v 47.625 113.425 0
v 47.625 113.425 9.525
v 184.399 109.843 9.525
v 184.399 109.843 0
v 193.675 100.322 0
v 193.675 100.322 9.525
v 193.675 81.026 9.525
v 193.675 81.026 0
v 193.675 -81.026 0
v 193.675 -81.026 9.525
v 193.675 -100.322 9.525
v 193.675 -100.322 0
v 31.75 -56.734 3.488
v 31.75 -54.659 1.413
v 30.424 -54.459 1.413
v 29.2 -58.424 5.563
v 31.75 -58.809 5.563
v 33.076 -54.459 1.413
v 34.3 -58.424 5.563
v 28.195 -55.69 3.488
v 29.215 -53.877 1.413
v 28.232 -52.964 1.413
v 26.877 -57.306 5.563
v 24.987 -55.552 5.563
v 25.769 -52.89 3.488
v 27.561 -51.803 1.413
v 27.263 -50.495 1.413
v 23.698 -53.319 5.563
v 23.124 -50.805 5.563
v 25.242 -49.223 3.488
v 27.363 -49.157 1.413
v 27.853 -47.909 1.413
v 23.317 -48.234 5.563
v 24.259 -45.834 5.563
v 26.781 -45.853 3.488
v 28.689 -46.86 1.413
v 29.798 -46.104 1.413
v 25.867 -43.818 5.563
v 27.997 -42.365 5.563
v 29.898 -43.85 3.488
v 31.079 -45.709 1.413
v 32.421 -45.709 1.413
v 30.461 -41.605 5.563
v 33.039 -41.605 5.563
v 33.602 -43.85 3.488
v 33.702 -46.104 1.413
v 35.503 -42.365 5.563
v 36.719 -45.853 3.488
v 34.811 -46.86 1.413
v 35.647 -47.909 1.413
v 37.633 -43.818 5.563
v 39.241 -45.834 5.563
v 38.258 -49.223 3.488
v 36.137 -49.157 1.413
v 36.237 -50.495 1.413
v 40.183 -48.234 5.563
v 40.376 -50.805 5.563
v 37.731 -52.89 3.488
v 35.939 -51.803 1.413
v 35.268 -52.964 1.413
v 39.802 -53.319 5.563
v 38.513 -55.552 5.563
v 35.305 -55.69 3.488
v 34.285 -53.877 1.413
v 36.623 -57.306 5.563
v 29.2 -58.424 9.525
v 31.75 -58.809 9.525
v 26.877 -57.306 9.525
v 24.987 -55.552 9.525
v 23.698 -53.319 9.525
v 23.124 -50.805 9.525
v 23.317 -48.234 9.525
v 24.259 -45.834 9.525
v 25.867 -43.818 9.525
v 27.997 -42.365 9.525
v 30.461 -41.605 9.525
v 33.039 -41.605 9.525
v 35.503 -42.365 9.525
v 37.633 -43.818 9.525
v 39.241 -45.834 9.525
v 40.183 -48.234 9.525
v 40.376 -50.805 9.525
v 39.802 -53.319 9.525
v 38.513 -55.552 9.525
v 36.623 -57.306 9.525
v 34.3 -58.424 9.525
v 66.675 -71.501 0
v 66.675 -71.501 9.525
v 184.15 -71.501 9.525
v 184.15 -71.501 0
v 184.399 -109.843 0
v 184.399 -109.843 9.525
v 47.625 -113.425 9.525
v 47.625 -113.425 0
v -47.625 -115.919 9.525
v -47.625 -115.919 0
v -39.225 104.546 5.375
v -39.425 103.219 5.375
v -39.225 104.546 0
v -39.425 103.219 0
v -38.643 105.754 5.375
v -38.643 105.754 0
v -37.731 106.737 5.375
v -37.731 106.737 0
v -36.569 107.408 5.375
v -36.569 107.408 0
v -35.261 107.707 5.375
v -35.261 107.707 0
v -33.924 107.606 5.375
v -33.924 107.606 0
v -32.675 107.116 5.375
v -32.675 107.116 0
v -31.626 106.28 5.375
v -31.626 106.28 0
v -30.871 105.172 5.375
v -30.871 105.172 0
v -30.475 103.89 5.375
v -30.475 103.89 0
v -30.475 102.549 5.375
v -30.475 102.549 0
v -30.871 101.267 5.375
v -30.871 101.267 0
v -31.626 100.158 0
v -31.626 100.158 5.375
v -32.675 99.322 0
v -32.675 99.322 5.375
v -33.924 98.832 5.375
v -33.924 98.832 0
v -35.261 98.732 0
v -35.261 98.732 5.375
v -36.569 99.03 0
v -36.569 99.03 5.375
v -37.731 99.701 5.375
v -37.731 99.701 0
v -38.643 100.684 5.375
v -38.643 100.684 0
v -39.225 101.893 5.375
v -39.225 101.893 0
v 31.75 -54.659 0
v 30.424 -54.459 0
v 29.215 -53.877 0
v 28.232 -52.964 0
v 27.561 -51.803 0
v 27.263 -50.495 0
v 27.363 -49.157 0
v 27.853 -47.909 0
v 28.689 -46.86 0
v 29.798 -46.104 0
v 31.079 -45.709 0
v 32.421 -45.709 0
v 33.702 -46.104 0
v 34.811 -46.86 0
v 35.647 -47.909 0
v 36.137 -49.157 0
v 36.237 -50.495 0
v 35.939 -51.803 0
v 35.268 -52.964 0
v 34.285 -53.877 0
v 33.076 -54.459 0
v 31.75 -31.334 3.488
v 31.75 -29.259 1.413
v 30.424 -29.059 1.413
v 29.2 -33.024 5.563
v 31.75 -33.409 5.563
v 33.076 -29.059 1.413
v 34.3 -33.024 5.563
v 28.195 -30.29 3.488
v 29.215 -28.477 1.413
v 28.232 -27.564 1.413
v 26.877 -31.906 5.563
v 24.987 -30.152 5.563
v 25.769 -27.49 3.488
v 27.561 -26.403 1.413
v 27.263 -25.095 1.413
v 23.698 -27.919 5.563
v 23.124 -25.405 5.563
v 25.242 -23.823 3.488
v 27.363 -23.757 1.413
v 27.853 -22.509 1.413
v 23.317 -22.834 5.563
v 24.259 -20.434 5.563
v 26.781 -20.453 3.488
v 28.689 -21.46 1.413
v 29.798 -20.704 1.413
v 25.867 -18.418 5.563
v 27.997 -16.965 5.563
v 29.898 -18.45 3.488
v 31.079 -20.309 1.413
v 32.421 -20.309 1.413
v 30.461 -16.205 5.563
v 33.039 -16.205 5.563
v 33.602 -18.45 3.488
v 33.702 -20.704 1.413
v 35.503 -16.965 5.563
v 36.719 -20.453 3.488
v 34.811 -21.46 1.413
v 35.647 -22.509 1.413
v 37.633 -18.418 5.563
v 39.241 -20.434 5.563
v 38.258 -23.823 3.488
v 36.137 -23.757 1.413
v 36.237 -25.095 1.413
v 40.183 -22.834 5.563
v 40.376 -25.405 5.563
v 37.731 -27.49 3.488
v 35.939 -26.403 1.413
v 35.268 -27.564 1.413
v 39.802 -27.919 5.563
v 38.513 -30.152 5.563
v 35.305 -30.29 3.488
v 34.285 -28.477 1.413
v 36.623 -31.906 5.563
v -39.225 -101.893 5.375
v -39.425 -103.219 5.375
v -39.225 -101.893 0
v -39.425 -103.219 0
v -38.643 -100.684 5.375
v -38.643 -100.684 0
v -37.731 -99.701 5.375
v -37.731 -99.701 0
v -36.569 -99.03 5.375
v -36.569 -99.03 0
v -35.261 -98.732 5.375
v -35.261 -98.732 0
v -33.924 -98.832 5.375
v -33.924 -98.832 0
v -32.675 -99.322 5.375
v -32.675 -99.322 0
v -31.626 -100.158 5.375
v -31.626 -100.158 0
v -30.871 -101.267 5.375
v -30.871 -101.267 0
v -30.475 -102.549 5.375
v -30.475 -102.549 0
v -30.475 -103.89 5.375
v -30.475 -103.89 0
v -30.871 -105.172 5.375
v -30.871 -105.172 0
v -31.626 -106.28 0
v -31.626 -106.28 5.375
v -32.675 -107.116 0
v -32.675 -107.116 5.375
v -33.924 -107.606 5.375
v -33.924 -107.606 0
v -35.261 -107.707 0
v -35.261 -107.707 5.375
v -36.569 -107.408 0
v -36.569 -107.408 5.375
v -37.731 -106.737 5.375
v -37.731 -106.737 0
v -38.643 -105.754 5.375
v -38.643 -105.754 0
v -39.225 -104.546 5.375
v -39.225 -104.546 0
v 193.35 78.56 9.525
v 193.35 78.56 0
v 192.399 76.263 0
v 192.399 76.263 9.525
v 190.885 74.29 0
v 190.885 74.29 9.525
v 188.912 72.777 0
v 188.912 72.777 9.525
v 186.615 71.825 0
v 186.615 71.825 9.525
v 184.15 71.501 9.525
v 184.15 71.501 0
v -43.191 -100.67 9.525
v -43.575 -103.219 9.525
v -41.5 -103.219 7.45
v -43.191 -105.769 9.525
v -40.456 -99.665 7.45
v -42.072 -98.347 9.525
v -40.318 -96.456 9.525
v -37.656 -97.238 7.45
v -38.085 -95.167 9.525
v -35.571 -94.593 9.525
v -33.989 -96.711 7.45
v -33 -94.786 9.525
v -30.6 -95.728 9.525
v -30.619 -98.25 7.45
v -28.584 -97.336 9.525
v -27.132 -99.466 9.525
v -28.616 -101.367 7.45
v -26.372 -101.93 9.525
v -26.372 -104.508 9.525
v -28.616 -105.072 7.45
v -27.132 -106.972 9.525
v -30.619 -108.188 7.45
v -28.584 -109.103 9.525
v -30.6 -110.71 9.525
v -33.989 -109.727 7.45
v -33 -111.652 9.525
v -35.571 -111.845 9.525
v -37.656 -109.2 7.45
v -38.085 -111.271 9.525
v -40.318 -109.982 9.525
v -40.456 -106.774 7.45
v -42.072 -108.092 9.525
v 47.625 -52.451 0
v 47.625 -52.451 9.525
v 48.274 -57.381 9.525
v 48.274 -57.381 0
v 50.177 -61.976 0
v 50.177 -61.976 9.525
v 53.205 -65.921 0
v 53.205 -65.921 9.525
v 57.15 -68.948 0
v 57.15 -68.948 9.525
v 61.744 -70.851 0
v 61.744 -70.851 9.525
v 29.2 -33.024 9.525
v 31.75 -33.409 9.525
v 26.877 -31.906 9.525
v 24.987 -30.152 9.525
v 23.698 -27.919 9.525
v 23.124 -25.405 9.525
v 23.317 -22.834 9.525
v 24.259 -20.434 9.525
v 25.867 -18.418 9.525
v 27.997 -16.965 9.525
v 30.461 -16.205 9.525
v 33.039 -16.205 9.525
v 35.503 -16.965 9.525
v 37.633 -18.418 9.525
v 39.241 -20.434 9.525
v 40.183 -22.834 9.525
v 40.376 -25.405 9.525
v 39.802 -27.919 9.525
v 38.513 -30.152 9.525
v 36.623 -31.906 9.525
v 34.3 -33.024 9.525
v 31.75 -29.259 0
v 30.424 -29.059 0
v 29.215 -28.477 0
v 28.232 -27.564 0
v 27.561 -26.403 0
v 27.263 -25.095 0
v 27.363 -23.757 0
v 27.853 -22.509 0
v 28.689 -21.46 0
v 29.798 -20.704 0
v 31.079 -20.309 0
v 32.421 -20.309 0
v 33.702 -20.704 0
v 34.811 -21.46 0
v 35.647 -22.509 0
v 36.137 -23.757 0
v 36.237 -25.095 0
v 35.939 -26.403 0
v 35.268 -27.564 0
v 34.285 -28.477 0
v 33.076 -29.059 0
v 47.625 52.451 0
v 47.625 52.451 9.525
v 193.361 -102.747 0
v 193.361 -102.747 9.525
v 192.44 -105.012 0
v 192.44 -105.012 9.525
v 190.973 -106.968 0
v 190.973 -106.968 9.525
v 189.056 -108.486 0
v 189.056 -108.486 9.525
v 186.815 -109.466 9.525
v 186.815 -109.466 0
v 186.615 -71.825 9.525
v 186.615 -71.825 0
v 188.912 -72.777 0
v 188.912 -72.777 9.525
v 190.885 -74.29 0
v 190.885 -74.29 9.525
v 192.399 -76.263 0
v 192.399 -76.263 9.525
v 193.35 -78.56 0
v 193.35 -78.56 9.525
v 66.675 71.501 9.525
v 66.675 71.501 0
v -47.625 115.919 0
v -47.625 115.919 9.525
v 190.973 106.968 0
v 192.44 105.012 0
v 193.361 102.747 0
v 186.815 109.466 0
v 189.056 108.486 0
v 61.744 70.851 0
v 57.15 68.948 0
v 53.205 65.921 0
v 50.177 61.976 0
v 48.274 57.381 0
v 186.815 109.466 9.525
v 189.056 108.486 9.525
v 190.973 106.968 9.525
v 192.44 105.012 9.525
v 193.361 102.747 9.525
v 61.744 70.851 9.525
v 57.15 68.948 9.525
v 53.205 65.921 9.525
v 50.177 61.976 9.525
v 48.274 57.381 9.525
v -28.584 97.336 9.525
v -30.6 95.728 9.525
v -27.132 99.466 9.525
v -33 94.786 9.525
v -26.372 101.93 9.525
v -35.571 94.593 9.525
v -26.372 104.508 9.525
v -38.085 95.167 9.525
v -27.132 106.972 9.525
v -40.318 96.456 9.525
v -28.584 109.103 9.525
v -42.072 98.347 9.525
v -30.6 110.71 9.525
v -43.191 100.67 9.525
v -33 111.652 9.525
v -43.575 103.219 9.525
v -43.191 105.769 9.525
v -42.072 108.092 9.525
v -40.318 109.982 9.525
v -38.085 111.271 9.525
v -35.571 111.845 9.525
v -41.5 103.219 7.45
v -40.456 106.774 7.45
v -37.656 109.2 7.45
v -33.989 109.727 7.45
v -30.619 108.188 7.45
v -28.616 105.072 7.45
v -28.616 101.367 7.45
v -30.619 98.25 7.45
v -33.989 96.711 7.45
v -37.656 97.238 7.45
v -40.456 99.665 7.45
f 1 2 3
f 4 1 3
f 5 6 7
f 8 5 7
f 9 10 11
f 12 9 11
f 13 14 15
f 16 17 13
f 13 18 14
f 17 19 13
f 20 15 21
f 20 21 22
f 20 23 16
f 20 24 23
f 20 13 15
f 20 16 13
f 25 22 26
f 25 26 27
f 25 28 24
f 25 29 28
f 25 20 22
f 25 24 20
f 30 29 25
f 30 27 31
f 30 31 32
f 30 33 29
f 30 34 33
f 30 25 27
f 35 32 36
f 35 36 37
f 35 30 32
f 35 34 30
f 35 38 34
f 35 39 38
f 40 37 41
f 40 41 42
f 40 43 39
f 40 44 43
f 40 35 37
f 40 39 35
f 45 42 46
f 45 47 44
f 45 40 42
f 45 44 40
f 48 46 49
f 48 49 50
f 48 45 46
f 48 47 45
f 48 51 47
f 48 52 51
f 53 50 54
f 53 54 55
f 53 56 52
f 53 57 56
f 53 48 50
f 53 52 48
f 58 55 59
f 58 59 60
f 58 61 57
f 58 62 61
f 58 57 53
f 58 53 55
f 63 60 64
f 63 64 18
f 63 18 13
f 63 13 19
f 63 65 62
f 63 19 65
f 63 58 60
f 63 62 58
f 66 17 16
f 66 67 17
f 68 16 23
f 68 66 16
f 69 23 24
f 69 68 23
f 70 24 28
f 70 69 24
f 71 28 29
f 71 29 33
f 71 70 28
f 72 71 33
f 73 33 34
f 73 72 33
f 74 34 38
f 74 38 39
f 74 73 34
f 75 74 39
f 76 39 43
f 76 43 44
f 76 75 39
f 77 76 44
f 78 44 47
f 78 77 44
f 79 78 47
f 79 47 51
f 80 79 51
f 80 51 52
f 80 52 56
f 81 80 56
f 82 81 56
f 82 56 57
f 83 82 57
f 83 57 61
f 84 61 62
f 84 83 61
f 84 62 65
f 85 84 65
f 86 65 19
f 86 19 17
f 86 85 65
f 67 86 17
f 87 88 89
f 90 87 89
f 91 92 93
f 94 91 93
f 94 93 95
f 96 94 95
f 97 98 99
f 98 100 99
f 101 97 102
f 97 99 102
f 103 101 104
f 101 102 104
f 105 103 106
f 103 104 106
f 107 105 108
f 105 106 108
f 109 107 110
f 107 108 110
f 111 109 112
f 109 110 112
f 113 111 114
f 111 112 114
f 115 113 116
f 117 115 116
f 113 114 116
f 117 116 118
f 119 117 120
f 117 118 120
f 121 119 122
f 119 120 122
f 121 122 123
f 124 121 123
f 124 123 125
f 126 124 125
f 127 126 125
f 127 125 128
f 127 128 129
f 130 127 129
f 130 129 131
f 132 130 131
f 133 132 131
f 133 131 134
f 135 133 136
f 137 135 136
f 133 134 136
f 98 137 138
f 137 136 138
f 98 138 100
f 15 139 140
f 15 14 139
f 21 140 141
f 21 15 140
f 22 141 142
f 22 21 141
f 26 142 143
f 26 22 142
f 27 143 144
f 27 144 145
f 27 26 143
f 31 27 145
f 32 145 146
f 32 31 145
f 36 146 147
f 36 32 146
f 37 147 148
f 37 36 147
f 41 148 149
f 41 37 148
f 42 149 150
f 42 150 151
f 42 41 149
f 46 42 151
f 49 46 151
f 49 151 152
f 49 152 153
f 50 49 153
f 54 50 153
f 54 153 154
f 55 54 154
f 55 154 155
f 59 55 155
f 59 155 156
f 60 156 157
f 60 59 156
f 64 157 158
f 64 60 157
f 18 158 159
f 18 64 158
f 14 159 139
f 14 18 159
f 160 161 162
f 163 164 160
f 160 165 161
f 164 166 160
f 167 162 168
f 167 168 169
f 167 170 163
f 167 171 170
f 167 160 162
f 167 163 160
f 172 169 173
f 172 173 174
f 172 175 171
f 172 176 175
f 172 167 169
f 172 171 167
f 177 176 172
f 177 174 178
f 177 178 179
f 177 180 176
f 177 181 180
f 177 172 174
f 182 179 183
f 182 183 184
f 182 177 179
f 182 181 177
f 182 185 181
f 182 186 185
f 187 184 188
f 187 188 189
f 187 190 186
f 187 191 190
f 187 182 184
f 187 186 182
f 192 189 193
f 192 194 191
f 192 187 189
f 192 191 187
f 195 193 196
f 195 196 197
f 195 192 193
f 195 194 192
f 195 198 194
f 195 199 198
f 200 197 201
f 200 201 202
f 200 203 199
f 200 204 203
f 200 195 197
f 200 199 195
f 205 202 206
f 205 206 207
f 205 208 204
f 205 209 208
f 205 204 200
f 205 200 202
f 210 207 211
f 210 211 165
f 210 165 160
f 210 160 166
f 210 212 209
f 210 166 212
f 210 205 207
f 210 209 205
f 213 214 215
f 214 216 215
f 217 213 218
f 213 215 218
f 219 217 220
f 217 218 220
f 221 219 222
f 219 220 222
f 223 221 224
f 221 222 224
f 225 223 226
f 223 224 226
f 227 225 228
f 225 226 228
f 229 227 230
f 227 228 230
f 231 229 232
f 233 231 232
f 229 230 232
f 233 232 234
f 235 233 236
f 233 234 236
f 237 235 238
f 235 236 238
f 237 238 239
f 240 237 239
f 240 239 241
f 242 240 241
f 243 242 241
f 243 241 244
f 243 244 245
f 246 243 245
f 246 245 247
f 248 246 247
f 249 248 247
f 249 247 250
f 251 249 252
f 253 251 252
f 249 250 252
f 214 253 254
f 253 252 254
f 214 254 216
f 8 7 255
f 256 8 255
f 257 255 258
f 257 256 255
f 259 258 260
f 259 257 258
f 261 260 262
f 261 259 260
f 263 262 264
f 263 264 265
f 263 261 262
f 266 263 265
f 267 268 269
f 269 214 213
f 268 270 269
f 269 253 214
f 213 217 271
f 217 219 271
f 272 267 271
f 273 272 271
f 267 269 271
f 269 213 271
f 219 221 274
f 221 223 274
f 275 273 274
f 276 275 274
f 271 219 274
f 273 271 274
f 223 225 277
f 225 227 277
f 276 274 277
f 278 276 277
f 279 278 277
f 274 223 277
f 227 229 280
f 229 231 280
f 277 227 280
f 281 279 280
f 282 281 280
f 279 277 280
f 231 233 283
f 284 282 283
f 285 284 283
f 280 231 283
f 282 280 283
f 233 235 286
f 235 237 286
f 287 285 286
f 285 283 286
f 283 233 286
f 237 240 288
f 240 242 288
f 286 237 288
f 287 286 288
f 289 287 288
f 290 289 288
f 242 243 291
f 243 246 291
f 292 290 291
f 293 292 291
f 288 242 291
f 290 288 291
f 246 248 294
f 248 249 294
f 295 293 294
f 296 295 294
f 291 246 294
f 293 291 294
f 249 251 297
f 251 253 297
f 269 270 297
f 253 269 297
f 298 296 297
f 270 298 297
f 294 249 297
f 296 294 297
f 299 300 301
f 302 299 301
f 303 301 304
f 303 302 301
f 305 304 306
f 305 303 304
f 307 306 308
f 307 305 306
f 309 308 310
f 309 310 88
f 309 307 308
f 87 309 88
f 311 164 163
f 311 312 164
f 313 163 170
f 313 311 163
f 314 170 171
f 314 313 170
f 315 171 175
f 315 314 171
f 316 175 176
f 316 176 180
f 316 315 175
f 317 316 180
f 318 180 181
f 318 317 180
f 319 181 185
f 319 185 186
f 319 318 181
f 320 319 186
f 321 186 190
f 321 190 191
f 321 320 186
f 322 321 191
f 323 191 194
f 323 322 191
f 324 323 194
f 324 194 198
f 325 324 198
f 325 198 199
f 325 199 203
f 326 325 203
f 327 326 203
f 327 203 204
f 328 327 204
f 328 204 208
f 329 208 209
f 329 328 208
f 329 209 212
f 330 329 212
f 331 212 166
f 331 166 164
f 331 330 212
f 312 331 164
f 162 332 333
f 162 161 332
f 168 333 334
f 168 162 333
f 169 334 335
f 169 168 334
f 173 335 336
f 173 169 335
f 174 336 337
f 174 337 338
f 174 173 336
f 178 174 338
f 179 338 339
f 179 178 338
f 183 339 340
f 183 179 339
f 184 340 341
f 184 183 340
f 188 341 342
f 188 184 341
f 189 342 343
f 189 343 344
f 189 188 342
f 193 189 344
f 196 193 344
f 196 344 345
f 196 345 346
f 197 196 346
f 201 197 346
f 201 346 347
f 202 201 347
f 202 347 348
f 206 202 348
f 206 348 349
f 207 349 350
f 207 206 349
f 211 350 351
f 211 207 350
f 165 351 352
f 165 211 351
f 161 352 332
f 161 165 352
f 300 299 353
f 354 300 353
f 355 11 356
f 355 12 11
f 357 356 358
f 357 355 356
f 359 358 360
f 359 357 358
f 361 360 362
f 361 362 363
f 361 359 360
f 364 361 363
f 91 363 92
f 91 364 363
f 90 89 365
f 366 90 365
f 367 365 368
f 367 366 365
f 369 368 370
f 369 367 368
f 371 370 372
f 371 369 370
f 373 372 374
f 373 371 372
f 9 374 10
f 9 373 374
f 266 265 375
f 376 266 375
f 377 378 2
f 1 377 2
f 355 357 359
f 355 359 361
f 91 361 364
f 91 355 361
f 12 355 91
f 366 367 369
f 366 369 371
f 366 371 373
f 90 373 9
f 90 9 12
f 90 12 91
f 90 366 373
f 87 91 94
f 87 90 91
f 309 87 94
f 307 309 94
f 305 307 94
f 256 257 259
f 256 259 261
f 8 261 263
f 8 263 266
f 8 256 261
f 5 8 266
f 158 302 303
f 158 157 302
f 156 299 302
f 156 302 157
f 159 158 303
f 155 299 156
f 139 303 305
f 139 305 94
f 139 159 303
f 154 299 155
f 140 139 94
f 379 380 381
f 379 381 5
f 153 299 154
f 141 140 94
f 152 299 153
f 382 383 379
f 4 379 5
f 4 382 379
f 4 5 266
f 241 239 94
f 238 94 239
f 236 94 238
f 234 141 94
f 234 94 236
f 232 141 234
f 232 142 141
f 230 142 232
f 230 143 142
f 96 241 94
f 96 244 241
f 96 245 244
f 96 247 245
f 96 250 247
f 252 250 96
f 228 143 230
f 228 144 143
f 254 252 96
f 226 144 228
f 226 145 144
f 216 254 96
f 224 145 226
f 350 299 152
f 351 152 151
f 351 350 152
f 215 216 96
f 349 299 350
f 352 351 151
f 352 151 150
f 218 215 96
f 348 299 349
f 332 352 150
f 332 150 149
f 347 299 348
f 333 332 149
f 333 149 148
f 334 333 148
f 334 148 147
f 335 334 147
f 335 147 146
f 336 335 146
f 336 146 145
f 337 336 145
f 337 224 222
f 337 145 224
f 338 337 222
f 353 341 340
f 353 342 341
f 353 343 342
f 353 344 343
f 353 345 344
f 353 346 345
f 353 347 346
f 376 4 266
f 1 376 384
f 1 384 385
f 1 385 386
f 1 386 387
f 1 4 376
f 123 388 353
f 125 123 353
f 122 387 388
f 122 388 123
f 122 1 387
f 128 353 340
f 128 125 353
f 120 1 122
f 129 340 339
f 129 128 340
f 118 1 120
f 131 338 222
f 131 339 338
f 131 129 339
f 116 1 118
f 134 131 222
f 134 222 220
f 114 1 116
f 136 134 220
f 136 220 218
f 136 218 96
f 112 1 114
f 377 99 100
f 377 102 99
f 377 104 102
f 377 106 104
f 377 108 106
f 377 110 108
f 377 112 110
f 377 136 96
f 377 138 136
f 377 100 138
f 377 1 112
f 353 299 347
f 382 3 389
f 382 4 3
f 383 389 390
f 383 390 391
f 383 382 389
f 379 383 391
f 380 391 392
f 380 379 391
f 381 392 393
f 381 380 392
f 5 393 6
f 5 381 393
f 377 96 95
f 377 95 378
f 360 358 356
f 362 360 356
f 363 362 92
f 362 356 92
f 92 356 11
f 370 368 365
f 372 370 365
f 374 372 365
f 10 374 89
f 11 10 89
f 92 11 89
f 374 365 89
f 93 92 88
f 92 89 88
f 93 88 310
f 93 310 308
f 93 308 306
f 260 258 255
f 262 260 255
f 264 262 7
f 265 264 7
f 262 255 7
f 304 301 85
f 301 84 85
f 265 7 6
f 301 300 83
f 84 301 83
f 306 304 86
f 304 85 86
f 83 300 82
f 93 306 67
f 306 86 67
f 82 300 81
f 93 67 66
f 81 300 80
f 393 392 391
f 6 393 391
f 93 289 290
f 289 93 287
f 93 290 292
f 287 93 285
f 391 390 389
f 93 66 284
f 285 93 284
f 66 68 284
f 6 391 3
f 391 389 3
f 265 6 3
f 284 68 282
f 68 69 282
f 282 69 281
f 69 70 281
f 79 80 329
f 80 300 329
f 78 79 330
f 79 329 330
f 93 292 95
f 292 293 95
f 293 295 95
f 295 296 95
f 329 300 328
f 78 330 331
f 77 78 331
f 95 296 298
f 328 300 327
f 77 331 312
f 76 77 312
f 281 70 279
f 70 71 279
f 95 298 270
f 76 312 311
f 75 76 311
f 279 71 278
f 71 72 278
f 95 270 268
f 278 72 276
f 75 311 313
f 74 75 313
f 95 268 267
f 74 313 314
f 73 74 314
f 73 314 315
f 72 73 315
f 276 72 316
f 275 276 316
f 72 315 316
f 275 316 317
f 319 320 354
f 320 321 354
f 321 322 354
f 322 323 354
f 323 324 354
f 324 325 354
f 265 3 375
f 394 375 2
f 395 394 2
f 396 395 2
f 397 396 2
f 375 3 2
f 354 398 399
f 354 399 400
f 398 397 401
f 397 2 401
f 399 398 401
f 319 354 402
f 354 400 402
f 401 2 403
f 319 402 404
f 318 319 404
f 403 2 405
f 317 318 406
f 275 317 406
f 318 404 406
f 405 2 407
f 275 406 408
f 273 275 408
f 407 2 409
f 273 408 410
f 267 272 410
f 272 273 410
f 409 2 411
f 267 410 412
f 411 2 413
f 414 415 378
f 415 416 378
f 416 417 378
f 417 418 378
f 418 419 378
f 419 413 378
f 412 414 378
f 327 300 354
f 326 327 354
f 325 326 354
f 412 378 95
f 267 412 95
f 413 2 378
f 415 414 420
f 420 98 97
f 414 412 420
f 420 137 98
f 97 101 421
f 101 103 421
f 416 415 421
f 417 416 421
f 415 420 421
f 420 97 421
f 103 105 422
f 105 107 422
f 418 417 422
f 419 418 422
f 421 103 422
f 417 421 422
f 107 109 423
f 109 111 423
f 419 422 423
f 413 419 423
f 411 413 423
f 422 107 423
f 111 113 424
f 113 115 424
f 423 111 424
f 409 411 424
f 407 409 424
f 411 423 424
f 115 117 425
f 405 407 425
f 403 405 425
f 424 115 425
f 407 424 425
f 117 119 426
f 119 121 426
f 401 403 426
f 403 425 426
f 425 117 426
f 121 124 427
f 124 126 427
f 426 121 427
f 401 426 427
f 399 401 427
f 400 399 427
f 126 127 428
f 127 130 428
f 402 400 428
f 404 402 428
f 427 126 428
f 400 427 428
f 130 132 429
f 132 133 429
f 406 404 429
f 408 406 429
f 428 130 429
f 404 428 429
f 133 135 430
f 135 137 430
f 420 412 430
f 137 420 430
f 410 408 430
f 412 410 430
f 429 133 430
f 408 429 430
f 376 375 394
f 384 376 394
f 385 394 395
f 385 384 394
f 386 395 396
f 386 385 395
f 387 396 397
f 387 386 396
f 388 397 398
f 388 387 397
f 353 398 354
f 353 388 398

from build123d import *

# Parameters (mm, degrees)
SKETCH1_W                                       = 95.25
SKETCH1_H                                       = 231.8385
EXTRUDE1_DEPTH                                  = 9.525
CSK_FOR_M8_FLAT_HEAD_MACHINE_SCREW1_AT_2_COUNT  = 2
CSK_FOR_M8_FLAT_HEAD_MACHINE_SCREW1_AT_2_PITCH  = 25.4
CSK_FOR_M8_FLAT_HEAD_MACHINE_SCREW2_D           = 9
CSK_FOR_M8_FLAT_HEAD_MACHINE_SCREW2_CSINK_D     = 17.3
CSK_FOR_M8_FLAT_HEAD_MACHINE_SCREW2_CSINK_ANGLE = 90
CUT_EXTRUDE1_REACH                              = 11.525
BOSS_EXTRUDE1_DEPTH                             = 9.525
FILLET1_R                                       = 9.525
FILLET2_R                                       = 19.05


with BuildPart() as part:
    # Sketch1 → Extrude1 (new body)
    with BuildSketch(Plane.XY):
        Rectangle(SKETCH1_W, SKETCH1_H)
    extrude(amount=EXTRUDE1_DEPTH)

    # Sketch2 → CSK for M8 Flat Head Machine Screw1 (revolve, cut)
    with BuildSketch(Plane(origin=(31.75, -50.15865, 9.525), x_dir=(0, -1, 0), z_dir=(1, 0, 0))):
        Polygon((0, 0), (0, 9.525), (4.5, 9.525), (4.5, 8.1124), (8.65, 3.9624), (8.65, 0), align=None)
    csk_for_m8_flat_head_machine_screw1 = revolve(axis=Axis((31.75, -50.15865, 15.875), (0, 0, -1)), mode=Mode.SUBTRACT)

    # CSK for M8 Flat Head Machine Screw1 at 2: CSK for M8 Flat Head Machine Screw1 ×2
    with Locations(*[(0, i * CSK_FOR_M8_FLAT_HEAD_MACHINE_SCREW1_AT_2_PITCH, 0) for i in range(1, CSK_FOR_M8_FLAT_HEAD_MACHINE_SCREW1_AT_2_COUNT)]):
        add(csk_for_m8_flat_head_machine_screw1, mode=Mode.SUBTRACT)

    # CSK for M8 Flat Head Machine Screw2 (through all)
    with Locations(Plane.XY.offset(9.525)):
        with Locations((-34.925, 103.21925), (-34.925, -103.21925)):
            CounterSinkHole(CSK_FOR_M8_FLAT_HEAD_MACHINE_SCREW2_D / 2, CSK_FOR_M8_FLAT_HEAD_MACHINE_SCREW2_CSINK_D / 2, counter_sink_angle=CSK_FOR_M8_FLAT_HEAD_MACHINE_SCREW2_CSINK_ANGLE)

    # Sketch11 → Cut-Extrude1 (cut, up to next)
    with BuildSketch(Plane.XY.offset(9.525), mode=Mode.PRIVATE) as cut_extrude1_sk1:
        Polygon((-47.625, 115.91925), (47.625, 113.425040971), (47.625, 115.91925), align=None)
    cut_extrude1_tool1 = extrude(cut_extrude1_sk1.sketch, amount=-CUT_EXTRUDE1_REACH, mode=Mode.PRIVATE) & part.part
    add(cut_extrude1_tool1.solids().sort_by_distance((15.875, 115.087847, 9.525))[0], mode=Mode.SUBTRACT)
    # Sketch11 → Cut-Extrude1 (cut, up to next)
    with BuildSketch(Plane.XY.offset(9.525), mode=Mode.PRIVATE) as cut_extrude1_sk2:
        Polygon((-47.625, -115.91925), (47.625, -115.91925), (47.625, -113.425040971), align=None)
    cut_extrude1_tool2 = extrude(cut_extrude1_sk2.sketch, amount=-CUT_EXTRUDE1_REACH, mode=Mode.PRIVATE) & part.part
    add(cut_extrude1_tool2.solids().sort_by_distance((15.875, -115.087847, 9.525))[0], mode=Mode.SUBTRACT)

    # Sketch12 → Boss-Extrude1 (add)
    with BuildSketch(Plane.XY.offset(9.525)):
        Polygon((47.625, 113.425040971), (193.675, 109.600587125), (193.675, 71.500587125), (47.625, 71.500587125), align=None)
        Polygon((47.625, -71.500587125), (193.675, -71.500587125), (193.675, -109.600587125), (47.625, -113.425040971), align=None)
    extrude(amount=-BOSS_EXTRUDE1_DEPTH)

    # Fillet1
    fillet1_edges = [part.edges().sort_by_distance(p)[0] for p in [
        (193.675, 109.600587125, 4.7625),
        (193.675, 71.500587125, 4.7625),
        (193.675, -71.500587125, 4.7625),
        (193.675, -109.600587125, 4.7625),
    ]]
    fillet(fillet1_edges, radius=FILLET1_R)

    # Fillet2
    fillet2_edges = [part.edges().sort_by_distance(p)[0] for p in [
        (47.625, 71.500587125, 4.7625),
        (47.625, -71.500587125, 4.7625),
    ]]
    fillet(fillet2_edges, radius=FILLET2_R)


solid = part.part
